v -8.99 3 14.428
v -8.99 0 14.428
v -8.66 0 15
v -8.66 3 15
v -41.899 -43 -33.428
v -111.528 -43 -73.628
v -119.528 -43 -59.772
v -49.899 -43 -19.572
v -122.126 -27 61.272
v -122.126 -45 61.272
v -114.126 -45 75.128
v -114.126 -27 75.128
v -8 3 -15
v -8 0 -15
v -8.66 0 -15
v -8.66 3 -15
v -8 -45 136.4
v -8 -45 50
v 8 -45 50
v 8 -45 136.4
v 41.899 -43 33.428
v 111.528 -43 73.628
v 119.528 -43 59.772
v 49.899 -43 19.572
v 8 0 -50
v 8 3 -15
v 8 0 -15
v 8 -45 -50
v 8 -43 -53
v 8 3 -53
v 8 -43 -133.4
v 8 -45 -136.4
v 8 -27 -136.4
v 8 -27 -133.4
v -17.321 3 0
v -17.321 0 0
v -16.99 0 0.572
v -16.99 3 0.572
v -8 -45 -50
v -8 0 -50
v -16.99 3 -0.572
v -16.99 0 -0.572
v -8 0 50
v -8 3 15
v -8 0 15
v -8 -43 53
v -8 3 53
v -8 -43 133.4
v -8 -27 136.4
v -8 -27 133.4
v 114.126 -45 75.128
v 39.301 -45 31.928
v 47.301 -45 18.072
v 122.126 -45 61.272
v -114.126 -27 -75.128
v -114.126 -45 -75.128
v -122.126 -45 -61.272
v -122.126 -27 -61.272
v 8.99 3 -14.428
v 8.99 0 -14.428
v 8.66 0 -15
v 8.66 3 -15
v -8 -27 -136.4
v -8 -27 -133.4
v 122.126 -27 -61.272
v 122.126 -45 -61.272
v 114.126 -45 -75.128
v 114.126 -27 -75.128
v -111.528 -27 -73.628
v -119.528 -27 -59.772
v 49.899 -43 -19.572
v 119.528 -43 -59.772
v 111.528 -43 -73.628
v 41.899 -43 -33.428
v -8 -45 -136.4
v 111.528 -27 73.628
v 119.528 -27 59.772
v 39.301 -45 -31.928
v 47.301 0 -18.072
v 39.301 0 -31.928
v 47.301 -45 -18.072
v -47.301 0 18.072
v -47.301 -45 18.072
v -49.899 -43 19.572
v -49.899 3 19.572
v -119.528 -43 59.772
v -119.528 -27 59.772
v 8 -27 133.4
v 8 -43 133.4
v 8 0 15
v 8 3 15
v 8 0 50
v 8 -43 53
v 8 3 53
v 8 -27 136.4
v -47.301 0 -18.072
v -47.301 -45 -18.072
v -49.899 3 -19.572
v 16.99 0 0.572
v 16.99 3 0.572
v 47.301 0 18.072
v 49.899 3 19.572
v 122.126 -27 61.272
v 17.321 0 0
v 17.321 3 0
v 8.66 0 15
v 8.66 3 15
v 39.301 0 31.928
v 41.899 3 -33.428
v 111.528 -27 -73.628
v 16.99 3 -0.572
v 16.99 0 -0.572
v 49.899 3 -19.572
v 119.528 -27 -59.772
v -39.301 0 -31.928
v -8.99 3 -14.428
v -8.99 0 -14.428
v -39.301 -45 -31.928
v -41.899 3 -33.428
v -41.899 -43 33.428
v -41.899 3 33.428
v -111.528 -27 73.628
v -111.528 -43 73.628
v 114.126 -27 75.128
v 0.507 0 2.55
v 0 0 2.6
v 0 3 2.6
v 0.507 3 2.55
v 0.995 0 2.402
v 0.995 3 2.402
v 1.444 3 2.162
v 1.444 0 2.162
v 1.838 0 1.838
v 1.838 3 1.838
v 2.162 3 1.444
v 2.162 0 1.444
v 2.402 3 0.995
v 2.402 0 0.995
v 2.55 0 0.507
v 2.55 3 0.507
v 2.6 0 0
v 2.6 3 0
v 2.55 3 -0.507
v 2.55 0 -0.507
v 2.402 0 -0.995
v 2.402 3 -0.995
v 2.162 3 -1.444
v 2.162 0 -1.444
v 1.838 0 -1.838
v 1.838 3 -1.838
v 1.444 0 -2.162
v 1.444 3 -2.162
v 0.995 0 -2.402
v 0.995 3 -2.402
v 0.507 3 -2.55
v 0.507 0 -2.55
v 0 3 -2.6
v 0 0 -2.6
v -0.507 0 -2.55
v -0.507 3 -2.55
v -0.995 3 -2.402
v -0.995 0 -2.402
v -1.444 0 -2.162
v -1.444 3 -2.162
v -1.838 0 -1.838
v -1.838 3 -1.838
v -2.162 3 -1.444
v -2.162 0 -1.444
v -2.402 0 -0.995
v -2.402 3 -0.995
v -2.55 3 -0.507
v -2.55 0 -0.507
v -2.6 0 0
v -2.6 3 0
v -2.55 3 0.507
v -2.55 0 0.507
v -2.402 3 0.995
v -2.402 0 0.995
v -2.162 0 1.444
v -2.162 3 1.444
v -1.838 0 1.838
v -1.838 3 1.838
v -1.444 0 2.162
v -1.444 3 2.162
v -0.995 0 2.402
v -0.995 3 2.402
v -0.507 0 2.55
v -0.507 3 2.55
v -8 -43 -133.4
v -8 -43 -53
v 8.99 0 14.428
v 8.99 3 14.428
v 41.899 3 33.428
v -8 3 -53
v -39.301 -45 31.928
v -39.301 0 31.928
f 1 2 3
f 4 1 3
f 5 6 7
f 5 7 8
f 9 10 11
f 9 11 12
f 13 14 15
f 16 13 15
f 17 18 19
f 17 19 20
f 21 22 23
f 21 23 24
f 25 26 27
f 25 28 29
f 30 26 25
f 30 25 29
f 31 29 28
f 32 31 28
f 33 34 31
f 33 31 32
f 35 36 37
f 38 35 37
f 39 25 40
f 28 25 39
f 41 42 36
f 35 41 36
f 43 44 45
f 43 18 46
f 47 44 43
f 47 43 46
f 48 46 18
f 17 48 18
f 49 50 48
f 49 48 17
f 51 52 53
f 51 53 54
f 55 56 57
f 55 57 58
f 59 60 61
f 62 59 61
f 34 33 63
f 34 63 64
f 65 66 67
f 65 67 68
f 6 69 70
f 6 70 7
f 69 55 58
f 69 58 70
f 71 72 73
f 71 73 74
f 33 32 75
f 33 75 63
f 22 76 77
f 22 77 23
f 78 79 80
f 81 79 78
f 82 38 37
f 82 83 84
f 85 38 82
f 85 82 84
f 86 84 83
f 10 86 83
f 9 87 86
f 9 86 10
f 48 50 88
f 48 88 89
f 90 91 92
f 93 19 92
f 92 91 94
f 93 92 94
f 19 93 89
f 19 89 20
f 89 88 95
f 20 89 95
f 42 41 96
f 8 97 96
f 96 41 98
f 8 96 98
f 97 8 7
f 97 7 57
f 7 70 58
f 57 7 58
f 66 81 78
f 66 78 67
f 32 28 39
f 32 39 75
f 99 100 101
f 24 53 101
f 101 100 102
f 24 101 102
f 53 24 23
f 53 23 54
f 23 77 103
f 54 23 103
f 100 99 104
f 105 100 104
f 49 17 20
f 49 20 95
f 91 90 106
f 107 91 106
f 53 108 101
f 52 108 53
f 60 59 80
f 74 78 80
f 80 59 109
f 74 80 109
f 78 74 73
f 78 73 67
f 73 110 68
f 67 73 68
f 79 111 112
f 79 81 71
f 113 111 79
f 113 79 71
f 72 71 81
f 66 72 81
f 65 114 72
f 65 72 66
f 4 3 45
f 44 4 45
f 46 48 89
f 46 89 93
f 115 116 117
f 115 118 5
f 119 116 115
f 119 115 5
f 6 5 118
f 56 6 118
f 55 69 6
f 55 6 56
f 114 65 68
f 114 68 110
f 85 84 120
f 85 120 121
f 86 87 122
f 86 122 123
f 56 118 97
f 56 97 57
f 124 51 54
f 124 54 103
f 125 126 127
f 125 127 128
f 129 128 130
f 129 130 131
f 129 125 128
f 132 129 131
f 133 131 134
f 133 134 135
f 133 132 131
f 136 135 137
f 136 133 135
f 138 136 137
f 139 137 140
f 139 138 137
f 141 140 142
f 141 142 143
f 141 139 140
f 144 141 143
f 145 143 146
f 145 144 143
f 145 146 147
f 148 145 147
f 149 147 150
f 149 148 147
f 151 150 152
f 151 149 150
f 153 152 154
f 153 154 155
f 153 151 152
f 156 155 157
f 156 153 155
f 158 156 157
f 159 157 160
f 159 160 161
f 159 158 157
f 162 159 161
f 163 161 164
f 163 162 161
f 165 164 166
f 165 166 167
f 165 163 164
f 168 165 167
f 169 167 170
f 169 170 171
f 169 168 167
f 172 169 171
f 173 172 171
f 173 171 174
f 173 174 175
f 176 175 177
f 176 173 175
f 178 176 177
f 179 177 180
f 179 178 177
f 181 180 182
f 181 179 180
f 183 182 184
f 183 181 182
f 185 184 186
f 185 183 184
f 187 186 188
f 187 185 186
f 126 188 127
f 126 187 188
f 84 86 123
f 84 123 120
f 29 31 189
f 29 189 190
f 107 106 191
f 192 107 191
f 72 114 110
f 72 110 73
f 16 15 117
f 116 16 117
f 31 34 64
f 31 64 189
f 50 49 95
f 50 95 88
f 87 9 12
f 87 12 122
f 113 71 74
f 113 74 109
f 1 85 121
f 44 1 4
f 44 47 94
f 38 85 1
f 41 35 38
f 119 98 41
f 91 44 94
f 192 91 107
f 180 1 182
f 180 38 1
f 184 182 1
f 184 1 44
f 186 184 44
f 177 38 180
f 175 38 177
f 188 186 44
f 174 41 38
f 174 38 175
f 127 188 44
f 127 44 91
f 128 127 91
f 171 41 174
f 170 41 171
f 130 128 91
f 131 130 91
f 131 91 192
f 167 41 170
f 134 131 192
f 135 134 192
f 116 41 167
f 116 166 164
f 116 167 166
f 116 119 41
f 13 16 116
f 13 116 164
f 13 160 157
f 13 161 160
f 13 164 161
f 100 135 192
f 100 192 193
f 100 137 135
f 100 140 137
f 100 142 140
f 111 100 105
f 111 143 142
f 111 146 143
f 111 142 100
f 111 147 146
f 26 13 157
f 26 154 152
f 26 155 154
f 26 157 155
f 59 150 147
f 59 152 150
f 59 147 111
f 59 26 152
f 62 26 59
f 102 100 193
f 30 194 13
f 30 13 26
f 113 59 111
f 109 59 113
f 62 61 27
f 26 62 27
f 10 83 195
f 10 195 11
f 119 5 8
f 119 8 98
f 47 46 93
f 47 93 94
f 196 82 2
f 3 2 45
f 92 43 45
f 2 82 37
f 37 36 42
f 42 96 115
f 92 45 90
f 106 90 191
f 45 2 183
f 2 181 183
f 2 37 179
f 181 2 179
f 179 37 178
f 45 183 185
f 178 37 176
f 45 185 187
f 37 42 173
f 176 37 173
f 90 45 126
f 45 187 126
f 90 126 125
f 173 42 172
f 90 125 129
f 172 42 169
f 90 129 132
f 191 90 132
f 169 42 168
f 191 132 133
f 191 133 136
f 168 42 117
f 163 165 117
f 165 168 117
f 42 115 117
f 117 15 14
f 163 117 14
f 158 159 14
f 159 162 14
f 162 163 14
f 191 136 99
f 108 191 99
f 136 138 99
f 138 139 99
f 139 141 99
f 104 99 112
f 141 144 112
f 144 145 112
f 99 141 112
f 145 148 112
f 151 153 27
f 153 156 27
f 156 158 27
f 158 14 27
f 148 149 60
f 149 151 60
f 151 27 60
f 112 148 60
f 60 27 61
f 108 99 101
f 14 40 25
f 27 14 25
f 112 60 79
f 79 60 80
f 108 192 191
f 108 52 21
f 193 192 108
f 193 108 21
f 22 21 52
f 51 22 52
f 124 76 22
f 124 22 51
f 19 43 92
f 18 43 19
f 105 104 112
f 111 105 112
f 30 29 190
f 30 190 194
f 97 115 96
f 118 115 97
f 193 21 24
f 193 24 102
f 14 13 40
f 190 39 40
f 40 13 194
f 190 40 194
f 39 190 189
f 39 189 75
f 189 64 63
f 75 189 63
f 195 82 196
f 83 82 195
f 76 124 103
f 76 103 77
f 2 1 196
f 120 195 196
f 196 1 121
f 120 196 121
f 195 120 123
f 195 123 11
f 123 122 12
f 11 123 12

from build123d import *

# Parameters (mm, degrees)
SKETCH_1_R               = 2.6
EXTRUDE_1_DEPTH          = 3
EXTRUDE_2_DEPTH          = 8
PATTERN_CIRCULAR_1_COUNT = 6


with BuildPart() as part:
    # 草图1 → 凸台-拉伸1 (new body)
    with BuildSketch(Plane(origin=(0, 0, 0), x_dir=(1, 0, 0), z_dir=(0, 1, 0))):
        Polygon((8.660254038, 15), (-8.660254038, 15), (-17.320508076, 0), (-8.660254038, -15), (8.660254038, -15), (17.320508076, 0), align=None)
        Circle(SKETCH_1_R, mode=Mode.SUBTRACT)
    extrude(amount=EXTRUDE_1_DEPTH)

    # 草图2 → 凸台-拉伸2 (add, symmetric)
    with BuildSketch(Plane(origin=(0, 0, 0), x_dir=(0, 0, -1), z_dir=(1, 0, 0))):
        Polygon((15, 0), (50, 0), (50, -45), (136.4, -45), (136.4, -27), (133.4, -27), (133.4, -43), (53, -43), (53, 3), (15, 3), align=None)
    extrude_2 = extrude(amount=EXTRUDE_2_DEPTH, both=True)

    # 阵列(圆周)1: 凸台-拉伸2 ×6 about axis
    pattern_circular_1_axis = Axis((0, 3, 0), (0, 1, 0))
    for i in range(1, PATTERN_CIRCULAR_1_COUNT):
        add(extrude_2.rotate(pattern_circular_1_axis, i * 360 / PATTERN_CIRCULAR_1_COUNT))


solid = part.part
